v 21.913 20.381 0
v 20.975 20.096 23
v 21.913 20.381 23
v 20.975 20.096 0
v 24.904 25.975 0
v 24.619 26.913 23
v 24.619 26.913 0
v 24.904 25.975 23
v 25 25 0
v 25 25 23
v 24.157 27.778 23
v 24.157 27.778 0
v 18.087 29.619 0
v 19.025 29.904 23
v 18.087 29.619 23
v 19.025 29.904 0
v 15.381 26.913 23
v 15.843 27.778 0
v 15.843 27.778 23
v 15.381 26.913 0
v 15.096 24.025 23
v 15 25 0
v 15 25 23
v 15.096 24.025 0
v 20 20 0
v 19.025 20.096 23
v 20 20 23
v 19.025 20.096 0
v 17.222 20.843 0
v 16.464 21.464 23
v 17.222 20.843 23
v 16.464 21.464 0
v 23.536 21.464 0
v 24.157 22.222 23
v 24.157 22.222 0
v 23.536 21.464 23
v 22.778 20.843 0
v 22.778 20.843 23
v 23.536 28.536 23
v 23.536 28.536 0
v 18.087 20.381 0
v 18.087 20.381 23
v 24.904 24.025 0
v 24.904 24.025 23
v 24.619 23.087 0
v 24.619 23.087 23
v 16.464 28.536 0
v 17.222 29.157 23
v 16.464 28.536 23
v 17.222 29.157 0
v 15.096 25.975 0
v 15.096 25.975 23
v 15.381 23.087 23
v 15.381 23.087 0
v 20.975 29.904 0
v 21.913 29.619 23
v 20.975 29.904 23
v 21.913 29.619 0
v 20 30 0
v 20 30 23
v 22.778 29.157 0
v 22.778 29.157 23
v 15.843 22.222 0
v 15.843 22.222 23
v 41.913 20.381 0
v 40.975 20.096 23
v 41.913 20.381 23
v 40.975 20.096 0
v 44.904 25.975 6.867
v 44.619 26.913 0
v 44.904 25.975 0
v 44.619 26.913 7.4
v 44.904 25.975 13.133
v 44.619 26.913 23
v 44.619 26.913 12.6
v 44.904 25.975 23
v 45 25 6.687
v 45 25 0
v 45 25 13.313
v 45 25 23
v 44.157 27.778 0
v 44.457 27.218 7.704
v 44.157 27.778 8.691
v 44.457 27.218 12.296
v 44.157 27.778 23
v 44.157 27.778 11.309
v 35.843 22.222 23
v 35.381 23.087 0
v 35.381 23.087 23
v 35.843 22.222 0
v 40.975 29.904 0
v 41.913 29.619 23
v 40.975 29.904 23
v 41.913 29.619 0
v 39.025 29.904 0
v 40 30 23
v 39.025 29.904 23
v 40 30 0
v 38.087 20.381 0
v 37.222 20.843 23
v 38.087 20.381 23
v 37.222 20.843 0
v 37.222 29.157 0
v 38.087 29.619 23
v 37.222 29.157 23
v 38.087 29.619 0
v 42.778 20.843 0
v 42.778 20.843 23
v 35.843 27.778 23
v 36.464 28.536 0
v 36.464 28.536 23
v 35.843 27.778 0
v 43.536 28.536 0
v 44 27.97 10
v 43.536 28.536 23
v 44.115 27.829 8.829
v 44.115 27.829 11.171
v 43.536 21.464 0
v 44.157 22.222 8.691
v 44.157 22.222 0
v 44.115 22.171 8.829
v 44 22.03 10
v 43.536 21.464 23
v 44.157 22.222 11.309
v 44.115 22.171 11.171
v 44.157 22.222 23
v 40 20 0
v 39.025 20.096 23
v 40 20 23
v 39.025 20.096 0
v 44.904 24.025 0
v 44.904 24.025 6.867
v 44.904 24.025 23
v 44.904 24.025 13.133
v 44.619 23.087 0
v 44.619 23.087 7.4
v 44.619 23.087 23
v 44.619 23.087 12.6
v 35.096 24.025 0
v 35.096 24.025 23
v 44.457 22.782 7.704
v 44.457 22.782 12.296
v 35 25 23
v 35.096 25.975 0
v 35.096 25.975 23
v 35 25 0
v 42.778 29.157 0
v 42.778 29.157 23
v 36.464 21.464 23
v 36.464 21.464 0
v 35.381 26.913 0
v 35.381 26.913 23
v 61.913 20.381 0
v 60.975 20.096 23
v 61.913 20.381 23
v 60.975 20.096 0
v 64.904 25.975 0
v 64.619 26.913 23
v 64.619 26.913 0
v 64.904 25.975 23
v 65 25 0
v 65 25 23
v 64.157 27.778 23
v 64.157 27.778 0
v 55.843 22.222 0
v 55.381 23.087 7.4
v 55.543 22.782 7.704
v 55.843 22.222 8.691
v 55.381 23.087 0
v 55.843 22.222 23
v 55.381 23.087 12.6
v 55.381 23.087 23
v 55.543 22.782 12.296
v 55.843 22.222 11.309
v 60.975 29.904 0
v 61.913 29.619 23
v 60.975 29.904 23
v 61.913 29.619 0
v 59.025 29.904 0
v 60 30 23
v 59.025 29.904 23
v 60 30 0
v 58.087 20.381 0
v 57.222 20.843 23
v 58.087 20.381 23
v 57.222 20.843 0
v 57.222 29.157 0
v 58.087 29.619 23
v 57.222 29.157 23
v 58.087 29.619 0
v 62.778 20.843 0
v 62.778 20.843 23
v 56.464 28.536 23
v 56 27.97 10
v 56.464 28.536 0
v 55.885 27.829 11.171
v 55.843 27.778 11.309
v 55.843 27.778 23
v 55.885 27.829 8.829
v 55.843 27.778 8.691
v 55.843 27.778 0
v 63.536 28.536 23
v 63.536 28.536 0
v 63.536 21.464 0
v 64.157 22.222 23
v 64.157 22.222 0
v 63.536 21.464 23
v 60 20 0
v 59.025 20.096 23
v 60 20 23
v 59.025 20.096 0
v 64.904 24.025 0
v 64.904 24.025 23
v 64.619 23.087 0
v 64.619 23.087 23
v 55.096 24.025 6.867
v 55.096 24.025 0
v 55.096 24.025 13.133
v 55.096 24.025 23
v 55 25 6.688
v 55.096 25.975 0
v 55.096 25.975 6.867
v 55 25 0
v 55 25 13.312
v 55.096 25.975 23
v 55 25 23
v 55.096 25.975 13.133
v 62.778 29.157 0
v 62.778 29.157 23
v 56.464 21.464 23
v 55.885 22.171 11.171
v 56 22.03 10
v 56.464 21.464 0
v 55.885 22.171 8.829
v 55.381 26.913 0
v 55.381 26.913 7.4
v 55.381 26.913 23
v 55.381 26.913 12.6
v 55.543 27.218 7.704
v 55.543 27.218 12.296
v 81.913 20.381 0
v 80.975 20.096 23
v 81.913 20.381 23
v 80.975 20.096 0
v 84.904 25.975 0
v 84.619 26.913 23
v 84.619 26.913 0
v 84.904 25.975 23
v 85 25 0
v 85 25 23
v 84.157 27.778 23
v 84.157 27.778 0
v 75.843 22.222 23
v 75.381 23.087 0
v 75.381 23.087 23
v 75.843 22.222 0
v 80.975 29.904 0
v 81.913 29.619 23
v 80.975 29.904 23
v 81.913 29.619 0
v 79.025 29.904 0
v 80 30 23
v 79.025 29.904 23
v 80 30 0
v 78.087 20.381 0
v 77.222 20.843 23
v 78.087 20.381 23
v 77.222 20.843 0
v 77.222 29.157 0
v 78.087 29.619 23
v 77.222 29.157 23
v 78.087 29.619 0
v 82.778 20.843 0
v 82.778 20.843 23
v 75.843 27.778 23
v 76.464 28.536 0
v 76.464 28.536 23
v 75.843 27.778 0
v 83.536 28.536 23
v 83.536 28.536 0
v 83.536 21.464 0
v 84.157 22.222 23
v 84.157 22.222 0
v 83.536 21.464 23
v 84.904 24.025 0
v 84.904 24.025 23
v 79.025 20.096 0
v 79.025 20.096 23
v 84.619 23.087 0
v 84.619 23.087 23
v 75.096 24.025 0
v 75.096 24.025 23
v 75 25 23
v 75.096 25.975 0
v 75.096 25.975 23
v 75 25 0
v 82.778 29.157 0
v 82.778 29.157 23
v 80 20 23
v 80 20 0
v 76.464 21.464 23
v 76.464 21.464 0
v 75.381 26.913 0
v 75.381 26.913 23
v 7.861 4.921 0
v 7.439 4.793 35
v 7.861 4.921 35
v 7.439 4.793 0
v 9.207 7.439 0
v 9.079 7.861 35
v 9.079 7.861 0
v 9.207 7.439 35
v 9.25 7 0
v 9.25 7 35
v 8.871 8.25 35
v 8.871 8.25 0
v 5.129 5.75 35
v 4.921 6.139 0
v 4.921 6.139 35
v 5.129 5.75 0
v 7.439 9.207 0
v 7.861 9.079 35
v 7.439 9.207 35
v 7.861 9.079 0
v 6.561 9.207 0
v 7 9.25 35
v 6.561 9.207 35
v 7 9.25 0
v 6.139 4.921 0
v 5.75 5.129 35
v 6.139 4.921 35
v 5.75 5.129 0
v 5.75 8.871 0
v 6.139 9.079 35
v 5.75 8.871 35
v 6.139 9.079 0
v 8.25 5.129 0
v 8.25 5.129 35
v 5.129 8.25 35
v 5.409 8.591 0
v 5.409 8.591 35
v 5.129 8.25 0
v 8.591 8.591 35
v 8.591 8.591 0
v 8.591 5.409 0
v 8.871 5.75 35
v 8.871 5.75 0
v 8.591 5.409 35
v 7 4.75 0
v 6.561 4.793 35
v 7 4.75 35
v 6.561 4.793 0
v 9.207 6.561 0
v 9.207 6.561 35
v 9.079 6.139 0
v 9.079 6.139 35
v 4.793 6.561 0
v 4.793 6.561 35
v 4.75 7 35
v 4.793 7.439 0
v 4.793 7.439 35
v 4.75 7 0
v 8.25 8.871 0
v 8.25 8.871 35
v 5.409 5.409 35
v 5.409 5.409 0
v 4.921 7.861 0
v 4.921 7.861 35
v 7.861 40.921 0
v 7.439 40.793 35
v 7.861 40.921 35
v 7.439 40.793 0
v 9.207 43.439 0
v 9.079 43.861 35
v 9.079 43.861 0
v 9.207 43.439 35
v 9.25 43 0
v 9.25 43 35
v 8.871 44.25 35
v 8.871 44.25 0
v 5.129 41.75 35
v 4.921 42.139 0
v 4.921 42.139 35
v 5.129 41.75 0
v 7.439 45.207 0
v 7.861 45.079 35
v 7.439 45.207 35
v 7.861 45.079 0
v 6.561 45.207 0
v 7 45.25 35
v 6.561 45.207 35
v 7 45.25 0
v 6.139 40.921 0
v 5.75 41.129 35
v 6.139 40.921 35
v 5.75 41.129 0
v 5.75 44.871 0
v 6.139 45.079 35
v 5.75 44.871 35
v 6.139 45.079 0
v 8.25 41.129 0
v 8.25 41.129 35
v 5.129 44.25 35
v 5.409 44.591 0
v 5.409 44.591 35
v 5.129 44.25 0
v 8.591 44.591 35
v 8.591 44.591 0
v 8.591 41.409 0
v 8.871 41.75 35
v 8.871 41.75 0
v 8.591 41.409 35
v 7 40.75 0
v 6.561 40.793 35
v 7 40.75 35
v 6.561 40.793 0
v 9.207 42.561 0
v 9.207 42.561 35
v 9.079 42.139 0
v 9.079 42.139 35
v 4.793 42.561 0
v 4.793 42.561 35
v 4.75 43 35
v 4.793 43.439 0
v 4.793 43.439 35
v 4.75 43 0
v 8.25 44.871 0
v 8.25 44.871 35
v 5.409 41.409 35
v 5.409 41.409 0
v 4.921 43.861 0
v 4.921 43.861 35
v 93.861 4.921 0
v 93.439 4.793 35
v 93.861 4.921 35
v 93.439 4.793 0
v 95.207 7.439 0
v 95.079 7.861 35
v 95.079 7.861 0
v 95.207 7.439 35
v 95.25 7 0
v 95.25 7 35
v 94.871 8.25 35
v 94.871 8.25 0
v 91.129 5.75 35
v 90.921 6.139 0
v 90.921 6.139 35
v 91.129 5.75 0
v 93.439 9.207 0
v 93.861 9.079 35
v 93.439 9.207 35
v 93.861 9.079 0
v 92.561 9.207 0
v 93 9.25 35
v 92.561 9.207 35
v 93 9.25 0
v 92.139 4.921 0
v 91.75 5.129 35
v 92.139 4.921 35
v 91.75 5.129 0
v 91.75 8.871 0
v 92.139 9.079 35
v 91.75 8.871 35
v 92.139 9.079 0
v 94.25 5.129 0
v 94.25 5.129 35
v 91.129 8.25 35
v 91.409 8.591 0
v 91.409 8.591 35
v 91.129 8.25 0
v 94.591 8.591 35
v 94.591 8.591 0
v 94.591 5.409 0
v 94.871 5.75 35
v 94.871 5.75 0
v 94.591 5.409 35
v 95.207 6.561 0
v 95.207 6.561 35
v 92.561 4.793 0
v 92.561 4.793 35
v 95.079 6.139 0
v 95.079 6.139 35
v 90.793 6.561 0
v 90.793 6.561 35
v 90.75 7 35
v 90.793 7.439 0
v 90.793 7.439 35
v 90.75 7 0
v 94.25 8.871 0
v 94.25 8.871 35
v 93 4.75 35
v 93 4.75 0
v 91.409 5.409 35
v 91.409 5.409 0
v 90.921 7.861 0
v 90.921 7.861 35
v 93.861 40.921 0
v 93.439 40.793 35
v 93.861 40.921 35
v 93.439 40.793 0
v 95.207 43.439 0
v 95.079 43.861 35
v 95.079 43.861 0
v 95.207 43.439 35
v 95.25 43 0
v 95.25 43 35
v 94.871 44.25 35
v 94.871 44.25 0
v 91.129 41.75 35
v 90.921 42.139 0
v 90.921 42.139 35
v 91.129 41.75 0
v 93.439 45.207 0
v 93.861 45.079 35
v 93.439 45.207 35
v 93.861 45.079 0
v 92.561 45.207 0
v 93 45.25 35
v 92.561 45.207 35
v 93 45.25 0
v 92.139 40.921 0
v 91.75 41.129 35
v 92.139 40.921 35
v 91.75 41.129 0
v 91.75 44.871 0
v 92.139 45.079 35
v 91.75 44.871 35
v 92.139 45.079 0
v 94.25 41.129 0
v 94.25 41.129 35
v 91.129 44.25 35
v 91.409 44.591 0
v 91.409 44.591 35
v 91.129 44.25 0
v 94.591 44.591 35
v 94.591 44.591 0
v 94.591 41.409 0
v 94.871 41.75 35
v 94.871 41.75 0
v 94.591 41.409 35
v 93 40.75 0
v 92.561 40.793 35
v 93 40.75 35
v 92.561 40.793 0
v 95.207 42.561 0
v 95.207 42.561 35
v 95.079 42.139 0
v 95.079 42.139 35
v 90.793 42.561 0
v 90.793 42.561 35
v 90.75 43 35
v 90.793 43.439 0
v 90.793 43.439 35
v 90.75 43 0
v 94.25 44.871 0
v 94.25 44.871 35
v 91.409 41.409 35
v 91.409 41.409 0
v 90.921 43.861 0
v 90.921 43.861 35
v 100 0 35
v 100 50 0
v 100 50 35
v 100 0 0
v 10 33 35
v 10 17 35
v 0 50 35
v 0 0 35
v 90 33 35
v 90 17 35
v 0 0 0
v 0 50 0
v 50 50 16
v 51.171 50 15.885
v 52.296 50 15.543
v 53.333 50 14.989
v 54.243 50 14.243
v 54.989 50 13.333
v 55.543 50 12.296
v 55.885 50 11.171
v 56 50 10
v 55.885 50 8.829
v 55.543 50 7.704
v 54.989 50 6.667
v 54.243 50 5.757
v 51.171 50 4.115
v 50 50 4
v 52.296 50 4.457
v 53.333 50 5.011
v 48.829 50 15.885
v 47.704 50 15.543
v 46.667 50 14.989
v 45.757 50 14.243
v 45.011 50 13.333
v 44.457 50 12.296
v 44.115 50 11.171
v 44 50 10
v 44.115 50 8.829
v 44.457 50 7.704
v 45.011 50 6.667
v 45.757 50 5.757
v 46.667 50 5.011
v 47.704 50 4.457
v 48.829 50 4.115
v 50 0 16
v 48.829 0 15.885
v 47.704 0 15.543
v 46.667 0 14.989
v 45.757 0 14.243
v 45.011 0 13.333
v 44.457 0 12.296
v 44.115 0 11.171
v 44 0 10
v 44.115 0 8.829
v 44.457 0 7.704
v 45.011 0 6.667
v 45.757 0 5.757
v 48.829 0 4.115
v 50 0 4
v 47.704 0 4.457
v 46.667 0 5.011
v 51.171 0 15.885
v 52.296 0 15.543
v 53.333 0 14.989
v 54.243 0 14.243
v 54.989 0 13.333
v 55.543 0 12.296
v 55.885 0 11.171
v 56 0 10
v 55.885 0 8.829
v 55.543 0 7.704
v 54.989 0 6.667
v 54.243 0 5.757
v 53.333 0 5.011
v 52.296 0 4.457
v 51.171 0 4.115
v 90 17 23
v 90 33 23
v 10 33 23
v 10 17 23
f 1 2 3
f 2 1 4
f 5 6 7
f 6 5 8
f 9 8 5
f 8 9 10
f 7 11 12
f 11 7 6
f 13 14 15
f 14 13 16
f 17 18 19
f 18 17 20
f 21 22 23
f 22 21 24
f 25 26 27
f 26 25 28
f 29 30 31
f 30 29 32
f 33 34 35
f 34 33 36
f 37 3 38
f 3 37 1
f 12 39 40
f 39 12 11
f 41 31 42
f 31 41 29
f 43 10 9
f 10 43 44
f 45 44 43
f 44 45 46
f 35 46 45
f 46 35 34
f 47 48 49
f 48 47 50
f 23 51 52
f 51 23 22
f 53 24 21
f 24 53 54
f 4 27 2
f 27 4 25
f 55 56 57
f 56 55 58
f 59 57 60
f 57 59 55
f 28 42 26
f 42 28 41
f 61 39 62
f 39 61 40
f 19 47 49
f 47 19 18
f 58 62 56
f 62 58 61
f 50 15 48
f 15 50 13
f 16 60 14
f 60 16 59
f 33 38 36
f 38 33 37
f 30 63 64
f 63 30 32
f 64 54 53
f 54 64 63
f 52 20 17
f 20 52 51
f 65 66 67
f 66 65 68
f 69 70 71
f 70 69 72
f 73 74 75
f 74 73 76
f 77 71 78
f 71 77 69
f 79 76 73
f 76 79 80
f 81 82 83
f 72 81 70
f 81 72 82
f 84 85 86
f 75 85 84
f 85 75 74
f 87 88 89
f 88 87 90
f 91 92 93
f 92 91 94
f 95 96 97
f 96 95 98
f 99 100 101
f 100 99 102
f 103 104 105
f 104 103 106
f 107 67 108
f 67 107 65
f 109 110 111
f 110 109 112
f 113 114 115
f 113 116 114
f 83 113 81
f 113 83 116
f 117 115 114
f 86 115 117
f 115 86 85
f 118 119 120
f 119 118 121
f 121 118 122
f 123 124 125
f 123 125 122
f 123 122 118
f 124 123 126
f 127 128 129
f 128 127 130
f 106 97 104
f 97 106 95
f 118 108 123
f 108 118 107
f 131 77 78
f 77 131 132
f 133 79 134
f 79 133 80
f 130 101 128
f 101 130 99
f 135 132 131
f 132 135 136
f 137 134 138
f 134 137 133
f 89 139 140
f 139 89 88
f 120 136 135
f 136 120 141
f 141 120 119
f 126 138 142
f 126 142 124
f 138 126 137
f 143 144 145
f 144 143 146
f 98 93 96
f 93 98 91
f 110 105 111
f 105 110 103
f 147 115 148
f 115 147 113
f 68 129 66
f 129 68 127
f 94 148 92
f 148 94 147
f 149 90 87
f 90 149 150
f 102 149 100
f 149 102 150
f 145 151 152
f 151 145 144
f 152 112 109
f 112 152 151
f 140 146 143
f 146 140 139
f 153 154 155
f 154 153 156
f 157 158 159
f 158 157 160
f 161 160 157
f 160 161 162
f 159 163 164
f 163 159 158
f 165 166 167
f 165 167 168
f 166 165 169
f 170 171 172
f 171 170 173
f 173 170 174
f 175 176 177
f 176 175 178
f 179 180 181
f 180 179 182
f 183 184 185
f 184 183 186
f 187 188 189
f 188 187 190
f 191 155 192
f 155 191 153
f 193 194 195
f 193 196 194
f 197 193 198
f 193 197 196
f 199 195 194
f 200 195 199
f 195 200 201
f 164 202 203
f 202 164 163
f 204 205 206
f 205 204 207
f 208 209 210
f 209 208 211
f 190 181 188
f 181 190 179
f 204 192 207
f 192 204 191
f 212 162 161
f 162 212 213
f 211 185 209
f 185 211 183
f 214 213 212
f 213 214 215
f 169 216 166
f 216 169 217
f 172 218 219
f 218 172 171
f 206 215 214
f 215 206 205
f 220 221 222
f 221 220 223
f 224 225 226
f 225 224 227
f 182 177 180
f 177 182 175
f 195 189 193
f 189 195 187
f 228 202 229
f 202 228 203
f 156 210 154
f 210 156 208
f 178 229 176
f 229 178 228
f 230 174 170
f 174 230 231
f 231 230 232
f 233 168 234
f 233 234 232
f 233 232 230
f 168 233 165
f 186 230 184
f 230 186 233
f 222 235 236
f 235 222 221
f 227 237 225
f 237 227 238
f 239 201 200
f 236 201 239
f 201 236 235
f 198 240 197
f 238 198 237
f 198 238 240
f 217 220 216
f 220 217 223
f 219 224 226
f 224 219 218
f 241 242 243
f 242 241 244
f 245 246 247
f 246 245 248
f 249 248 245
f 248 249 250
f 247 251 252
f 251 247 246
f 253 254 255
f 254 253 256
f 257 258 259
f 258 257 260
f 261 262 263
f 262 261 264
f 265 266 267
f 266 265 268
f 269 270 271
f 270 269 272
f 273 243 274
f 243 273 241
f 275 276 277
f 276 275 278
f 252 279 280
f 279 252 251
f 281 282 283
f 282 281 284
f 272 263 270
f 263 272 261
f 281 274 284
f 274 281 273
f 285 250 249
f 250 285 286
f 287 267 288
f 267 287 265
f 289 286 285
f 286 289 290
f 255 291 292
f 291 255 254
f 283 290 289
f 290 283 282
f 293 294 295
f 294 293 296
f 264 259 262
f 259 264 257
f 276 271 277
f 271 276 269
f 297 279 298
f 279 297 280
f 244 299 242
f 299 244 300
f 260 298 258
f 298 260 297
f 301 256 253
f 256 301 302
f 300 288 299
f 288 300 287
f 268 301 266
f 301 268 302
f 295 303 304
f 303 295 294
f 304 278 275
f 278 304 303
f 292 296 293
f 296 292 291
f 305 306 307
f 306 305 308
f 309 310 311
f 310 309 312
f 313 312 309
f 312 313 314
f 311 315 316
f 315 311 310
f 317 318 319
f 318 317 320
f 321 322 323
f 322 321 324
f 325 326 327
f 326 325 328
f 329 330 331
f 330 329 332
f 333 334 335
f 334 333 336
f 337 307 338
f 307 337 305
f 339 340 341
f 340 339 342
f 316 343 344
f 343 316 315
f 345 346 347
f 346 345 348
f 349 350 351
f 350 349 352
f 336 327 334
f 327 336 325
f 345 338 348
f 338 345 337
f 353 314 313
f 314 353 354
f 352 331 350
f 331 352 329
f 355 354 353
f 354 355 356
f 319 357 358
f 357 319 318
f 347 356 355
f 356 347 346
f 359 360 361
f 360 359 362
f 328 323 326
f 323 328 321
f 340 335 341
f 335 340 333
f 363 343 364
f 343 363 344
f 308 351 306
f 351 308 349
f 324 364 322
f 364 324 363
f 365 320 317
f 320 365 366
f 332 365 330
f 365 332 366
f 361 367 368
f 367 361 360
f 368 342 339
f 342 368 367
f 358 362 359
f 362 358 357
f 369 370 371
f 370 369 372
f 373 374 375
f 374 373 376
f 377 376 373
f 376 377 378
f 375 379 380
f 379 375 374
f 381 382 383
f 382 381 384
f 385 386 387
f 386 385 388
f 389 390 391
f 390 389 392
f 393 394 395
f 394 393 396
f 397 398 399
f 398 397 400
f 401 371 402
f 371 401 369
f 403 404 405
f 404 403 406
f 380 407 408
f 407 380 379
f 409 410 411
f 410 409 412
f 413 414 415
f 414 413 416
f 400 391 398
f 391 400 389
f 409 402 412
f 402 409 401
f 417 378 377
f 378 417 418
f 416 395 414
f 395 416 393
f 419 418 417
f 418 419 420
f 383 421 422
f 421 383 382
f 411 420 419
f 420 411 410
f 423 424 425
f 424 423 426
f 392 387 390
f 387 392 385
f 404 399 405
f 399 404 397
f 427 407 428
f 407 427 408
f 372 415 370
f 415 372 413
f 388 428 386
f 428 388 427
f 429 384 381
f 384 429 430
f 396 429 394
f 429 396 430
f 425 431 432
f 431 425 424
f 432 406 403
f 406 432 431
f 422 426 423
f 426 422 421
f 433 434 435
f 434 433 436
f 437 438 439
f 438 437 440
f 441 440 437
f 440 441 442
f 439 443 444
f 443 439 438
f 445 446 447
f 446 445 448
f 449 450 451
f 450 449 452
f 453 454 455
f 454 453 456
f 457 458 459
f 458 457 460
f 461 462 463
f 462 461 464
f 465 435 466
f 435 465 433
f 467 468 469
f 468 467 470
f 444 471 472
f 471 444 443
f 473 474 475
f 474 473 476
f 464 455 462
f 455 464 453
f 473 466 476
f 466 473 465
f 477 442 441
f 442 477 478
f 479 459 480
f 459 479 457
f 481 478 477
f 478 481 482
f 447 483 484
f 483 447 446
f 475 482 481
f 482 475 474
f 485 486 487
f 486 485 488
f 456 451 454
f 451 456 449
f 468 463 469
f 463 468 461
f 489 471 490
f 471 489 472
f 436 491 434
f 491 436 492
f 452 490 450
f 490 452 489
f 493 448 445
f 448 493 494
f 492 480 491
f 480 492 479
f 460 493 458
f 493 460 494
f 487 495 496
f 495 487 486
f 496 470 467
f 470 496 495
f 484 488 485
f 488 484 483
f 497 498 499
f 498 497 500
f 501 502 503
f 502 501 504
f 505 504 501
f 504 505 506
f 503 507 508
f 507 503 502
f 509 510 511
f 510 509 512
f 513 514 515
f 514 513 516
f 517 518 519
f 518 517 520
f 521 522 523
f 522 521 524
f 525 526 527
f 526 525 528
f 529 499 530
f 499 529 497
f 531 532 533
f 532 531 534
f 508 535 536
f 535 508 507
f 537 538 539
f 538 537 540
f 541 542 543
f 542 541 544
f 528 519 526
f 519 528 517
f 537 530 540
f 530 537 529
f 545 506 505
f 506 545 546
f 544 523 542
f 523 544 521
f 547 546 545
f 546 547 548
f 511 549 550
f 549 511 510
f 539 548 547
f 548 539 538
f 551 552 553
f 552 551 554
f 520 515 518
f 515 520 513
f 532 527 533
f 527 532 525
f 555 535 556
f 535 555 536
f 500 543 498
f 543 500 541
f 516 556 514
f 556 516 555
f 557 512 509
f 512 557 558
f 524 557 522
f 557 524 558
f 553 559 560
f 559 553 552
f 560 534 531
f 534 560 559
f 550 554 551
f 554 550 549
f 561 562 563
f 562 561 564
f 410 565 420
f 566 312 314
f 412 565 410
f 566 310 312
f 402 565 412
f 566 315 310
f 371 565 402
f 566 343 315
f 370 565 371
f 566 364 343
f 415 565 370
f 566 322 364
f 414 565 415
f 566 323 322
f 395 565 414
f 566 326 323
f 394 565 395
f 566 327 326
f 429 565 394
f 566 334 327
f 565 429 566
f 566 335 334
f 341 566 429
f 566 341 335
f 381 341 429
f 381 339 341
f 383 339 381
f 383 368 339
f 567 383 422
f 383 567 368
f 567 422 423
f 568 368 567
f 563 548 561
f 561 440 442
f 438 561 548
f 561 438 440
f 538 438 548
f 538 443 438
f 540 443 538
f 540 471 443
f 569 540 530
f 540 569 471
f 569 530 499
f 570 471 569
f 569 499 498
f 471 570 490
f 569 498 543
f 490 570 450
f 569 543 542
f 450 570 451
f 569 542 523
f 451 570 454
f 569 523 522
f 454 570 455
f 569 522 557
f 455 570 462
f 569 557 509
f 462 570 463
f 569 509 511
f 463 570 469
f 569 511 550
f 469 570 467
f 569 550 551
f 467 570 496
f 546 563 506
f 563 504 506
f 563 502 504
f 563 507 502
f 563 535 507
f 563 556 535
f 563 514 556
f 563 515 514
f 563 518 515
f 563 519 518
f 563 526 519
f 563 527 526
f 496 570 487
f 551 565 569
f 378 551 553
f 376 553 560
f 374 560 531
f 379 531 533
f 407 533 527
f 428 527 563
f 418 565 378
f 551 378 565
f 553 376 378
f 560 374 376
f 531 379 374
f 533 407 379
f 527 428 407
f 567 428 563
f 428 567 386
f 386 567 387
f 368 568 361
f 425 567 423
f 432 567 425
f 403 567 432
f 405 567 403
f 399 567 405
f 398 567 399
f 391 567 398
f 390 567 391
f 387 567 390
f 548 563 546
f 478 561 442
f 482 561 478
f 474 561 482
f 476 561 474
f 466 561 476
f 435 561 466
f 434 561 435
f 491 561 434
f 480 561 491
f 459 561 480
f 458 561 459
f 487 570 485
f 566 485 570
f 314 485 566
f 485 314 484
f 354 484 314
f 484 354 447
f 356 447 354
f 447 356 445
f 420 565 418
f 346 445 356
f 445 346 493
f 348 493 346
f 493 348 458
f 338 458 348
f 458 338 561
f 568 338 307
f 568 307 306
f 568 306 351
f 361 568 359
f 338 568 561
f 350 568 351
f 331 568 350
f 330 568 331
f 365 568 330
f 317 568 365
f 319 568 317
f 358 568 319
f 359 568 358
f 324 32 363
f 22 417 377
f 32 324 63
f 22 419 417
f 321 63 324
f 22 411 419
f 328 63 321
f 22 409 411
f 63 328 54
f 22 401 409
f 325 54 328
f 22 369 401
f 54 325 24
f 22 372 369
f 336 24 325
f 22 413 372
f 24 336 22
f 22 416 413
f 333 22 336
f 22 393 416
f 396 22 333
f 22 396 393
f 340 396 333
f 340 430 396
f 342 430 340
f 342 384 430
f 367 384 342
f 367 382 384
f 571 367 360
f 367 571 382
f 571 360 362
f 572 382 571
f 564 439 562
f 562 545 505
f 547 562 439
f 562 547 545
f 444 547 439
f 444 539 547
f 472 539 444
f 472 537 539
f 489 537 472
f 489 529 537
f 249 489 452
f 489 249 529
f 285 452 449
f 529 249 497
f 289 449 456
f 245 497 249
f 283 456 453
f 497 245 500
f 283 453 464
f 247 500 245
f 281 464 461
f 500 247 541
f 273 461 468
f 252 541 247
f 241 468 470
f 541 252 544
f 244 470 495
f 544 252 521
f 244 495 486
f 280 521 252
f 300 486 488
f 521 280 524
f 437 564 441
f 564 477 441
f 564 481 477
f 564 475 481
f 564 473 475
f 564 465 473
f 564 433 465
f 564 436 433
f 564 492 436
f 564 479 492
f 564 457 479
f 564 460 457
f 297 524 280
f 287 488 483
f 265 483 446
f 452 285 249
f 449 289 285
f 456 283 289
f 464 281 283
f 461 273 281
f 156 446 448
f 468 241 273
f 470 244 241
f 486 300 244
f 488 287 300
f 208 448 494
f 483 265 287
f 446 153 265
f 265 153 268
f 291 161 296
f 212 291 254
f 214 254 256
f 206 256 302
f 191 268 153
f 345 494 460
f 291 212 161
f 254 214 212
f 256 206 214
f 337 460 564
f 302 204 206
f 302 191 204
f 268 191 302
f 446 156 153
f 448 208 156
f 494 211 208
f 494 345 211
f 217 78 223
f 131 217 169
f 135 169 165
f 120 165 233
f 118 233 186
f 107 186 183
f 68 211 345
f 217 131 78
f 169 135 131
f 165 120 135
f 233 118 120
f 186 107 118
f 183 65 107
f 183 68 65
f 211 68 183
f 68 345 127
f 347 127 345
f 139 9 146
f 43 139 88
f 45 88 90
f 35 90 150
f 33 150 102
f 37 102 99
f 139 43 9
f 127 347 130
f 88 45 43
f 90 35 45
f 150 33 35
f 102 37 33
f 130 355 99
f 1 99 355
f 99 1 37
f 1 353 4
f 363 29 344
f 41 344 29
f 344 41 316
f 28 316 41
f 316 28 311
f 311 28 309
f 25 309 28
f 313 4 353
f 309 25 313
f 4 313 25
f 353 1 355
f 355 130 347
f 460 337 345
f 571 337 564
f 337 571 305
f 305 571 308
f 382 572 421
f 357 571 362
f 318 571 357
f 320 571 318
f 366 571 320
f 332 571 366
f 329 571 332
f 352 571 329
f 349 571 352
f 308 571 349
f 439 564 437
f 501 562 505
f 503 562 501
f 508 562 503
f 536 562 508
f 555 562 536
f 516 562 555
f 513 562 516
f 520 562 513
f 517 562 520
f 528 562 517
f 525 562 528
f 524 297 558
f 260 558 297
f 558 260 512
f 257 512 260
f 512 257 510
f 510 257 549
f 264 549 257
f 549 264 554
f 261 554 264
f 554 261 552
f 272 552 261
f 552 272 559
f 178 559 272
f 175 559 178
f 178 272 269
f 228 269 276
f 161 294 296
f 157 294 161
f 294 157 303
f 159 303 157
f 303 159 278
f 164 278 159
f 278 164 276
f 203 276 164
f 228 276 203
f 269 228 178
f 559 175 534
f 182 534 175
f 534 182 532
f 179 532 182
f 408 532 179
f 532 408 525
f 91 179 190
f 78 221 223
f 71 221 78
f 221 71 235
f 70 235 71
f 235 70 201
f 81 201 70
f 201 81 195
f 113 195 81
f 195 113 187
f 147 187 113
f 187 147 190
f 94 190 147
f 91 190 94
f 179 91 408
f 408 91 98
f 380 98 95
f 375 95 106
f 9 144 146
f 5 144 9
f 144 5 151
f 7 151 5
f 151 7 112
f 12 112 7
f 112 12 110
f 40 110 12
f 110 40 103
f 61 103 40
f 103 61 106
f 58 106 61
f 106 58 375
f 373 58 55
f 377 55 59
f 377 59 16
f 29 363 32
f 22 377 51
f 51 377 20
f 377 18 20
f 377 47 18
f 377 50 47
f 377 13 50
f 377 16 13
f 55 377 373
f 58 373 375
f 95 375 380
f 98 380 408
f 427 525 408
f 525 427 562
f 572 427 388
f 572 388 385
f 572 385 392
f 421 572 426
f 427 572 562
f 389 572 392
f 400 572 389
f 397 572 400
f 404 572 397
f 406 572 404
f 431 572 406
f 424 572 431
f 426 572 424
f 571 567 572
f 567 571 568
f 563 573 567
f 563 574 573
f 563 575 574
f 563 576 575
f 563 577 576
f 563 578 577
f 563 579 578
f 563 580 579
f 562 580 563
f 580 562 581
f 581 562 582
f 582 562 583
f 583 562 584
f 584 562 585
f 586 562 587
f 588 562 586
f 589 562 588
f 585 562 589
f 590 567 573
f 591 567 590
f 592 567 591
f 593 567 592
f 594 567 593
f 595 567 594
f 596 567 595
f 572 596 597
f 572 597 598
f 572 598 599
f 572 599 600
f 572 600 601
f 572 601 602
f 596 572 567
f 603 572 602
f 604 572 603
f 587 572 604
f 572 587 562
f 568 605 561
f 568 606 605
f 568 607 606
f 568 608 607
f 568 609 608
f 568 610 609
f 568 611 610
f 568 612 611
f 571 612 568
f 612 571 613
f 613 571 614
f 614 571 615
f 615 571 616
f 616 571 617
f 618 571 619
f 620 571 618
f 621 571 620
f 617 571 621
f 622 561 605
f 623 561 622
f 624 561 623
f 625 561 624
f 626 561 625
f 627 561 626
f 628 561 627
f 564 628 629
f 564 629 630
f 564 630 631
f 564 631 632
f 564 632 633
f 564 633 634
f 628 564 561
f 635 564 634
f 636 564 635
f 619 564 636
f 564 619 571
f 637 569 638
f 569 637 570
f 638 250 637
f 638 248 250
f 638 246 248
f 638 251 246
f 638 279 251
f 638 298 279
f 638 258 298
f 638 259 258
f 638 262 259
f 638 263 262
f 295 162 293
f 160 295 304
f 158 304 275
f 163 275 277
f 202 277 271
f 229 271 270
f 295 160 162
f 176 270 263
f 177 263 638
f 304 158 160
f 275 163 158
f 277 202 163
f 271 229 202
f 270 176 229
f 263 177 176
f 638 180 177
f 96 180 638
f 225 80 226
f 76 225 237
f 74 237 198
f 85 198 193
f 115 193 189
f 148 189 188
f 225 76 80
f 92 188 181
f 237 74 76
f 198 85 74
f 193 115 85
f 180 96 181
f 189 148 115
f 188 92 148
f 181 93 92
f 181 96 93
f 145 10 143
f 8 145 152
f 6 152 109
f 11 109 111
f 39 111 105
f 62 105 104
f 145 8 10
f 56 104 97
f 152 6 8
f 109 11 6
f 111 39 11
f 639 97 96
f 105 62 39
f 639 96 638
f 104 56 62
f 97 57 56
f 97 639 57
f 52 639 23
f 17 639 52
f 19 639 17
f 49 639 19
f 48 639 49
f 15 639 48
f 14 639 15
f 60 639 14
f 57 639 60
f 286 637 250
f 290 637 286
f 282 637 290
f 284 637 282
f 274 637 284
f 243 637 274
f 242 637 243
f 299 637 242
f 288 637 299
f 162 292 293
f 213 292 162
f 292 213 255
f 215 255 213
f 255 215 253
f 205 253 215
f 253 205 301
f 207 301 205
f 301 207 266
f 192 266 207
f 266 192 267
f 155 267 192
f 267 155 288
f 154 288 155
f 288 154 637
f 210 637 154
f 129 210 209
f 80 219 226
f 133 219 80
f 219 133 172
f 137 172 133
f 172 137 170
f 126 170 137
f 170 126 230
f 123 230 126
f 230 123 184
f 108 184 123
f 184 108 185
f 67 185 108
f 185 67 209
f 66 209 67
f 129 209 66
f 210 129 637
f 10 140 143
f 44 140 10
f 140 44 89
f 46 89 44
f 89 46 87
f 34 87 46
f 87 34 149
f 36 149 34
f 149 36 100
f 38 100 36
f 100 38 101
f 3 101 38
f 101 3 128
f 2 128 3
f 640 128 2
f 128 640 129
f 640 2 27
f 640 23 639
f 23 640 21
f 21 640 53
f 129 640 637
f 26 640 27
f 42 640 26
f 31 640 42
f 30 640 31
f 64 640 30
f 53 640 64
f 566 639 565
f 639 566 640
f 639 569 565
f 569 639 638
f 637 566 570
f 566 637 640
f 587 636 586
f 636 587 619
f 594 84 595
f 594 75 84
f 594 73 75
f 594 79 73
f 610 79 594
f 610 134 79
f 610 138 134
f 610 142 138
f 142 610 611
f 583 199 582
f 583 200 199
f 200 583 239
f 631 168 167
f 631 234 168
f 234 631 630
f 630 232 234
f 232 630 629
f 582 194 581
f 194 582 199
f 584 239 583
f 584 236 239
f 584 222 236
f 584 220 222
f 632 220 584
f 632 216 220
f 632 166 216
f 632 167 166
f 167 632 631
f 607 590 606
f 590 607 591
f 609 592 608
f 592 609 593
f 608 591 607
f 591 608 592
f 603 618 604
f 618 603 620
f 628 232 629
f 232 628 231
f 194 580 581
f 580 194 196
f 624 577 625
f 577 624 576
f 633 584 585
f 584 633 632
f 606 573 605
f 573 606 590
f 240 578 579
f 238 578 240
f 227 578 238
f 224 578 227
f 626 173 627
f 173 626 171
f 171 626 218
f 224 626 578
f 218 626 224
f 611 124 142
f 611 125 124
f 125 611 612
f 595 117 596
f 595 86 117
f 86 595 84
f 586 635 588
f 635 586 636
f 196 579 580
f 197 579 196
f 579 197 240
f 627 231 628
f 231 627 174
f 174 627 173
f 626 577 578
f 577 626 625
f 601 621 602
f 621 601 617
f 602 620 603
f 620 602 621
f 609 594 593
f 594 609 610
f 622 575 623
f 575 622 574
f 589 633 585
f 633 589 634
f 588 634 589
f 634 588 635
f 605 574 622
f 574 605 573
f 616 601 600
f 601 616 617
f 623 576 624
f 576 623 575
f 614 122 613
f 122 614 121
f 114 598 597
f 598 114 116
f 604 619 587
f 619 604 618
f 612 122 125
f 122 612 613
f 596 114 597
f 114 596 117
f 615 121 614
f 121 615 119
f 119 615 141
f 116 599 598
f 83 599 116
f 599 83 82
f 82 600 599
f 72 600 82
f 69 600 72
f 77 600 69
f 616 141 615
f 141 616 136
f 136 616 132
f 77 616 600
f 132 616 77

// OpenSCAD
$fn = 32;

// ----------------------------------------------------------------------
// Manifold block: side_outlet manifold
// ----------------------------------------------------------------------

// --- parameters (mm) ---
block_l = 100;            // block length, X
block_w = 50;             // block width, Y
block_h = 35;             // block height, Z
port_d = 10;              // port bore diameter
port_pitch = 20;          // port pitch along X
gallery_d = 16;           // top gallery width, Y
gallery_depth = 12;       // gallery pocket depth
wall_p = 10;              // gallery end wall thickness, X
mnt_d = 4.5;              // mounting hole diameter
mnt_in = 7;               // mounting hole inset from the edges
out_d = 12;               // outlet bore diameter
out_z = 10;               // outlet axis height
fit_tol = 0.05;           // tolerance for press fits, mm
free_tol = 0.3;           // tolerance for clearance fits, mm

n_ports = 4;  // ports in the row
port_x0 = (block_l - (n_ports - 1) * port_pitch) / 2;  // first port X

difference() {
  cube([block_l, block_w, block_h]);
  for (i = [0 : n_ports - 1])
    translate([port_x0 + i * port_pitch, block_w / 2, -1])
      cylinder(h = block_h + 2, d = port_d);
  translate([wall_p, block_w / 2 - gallery_d / 2, block_h - gallery_depth])
    cube([block_l - 2 * wall_p, gallery_d, gallery_depth + 1]);
  for (cx = [mnt_in, block_l - mnt_in])
    for (cy = [mnt_in, block_w - mnt_in])
      translate([cx, cy, -1]) cylinder(h = block_h + 2, d = mnt_d);
  translate([block_l / 2, -1, out_z]) rotate([-90, 0, 0])
    cylinder(h = block_w + 2, d = out_d);
}
